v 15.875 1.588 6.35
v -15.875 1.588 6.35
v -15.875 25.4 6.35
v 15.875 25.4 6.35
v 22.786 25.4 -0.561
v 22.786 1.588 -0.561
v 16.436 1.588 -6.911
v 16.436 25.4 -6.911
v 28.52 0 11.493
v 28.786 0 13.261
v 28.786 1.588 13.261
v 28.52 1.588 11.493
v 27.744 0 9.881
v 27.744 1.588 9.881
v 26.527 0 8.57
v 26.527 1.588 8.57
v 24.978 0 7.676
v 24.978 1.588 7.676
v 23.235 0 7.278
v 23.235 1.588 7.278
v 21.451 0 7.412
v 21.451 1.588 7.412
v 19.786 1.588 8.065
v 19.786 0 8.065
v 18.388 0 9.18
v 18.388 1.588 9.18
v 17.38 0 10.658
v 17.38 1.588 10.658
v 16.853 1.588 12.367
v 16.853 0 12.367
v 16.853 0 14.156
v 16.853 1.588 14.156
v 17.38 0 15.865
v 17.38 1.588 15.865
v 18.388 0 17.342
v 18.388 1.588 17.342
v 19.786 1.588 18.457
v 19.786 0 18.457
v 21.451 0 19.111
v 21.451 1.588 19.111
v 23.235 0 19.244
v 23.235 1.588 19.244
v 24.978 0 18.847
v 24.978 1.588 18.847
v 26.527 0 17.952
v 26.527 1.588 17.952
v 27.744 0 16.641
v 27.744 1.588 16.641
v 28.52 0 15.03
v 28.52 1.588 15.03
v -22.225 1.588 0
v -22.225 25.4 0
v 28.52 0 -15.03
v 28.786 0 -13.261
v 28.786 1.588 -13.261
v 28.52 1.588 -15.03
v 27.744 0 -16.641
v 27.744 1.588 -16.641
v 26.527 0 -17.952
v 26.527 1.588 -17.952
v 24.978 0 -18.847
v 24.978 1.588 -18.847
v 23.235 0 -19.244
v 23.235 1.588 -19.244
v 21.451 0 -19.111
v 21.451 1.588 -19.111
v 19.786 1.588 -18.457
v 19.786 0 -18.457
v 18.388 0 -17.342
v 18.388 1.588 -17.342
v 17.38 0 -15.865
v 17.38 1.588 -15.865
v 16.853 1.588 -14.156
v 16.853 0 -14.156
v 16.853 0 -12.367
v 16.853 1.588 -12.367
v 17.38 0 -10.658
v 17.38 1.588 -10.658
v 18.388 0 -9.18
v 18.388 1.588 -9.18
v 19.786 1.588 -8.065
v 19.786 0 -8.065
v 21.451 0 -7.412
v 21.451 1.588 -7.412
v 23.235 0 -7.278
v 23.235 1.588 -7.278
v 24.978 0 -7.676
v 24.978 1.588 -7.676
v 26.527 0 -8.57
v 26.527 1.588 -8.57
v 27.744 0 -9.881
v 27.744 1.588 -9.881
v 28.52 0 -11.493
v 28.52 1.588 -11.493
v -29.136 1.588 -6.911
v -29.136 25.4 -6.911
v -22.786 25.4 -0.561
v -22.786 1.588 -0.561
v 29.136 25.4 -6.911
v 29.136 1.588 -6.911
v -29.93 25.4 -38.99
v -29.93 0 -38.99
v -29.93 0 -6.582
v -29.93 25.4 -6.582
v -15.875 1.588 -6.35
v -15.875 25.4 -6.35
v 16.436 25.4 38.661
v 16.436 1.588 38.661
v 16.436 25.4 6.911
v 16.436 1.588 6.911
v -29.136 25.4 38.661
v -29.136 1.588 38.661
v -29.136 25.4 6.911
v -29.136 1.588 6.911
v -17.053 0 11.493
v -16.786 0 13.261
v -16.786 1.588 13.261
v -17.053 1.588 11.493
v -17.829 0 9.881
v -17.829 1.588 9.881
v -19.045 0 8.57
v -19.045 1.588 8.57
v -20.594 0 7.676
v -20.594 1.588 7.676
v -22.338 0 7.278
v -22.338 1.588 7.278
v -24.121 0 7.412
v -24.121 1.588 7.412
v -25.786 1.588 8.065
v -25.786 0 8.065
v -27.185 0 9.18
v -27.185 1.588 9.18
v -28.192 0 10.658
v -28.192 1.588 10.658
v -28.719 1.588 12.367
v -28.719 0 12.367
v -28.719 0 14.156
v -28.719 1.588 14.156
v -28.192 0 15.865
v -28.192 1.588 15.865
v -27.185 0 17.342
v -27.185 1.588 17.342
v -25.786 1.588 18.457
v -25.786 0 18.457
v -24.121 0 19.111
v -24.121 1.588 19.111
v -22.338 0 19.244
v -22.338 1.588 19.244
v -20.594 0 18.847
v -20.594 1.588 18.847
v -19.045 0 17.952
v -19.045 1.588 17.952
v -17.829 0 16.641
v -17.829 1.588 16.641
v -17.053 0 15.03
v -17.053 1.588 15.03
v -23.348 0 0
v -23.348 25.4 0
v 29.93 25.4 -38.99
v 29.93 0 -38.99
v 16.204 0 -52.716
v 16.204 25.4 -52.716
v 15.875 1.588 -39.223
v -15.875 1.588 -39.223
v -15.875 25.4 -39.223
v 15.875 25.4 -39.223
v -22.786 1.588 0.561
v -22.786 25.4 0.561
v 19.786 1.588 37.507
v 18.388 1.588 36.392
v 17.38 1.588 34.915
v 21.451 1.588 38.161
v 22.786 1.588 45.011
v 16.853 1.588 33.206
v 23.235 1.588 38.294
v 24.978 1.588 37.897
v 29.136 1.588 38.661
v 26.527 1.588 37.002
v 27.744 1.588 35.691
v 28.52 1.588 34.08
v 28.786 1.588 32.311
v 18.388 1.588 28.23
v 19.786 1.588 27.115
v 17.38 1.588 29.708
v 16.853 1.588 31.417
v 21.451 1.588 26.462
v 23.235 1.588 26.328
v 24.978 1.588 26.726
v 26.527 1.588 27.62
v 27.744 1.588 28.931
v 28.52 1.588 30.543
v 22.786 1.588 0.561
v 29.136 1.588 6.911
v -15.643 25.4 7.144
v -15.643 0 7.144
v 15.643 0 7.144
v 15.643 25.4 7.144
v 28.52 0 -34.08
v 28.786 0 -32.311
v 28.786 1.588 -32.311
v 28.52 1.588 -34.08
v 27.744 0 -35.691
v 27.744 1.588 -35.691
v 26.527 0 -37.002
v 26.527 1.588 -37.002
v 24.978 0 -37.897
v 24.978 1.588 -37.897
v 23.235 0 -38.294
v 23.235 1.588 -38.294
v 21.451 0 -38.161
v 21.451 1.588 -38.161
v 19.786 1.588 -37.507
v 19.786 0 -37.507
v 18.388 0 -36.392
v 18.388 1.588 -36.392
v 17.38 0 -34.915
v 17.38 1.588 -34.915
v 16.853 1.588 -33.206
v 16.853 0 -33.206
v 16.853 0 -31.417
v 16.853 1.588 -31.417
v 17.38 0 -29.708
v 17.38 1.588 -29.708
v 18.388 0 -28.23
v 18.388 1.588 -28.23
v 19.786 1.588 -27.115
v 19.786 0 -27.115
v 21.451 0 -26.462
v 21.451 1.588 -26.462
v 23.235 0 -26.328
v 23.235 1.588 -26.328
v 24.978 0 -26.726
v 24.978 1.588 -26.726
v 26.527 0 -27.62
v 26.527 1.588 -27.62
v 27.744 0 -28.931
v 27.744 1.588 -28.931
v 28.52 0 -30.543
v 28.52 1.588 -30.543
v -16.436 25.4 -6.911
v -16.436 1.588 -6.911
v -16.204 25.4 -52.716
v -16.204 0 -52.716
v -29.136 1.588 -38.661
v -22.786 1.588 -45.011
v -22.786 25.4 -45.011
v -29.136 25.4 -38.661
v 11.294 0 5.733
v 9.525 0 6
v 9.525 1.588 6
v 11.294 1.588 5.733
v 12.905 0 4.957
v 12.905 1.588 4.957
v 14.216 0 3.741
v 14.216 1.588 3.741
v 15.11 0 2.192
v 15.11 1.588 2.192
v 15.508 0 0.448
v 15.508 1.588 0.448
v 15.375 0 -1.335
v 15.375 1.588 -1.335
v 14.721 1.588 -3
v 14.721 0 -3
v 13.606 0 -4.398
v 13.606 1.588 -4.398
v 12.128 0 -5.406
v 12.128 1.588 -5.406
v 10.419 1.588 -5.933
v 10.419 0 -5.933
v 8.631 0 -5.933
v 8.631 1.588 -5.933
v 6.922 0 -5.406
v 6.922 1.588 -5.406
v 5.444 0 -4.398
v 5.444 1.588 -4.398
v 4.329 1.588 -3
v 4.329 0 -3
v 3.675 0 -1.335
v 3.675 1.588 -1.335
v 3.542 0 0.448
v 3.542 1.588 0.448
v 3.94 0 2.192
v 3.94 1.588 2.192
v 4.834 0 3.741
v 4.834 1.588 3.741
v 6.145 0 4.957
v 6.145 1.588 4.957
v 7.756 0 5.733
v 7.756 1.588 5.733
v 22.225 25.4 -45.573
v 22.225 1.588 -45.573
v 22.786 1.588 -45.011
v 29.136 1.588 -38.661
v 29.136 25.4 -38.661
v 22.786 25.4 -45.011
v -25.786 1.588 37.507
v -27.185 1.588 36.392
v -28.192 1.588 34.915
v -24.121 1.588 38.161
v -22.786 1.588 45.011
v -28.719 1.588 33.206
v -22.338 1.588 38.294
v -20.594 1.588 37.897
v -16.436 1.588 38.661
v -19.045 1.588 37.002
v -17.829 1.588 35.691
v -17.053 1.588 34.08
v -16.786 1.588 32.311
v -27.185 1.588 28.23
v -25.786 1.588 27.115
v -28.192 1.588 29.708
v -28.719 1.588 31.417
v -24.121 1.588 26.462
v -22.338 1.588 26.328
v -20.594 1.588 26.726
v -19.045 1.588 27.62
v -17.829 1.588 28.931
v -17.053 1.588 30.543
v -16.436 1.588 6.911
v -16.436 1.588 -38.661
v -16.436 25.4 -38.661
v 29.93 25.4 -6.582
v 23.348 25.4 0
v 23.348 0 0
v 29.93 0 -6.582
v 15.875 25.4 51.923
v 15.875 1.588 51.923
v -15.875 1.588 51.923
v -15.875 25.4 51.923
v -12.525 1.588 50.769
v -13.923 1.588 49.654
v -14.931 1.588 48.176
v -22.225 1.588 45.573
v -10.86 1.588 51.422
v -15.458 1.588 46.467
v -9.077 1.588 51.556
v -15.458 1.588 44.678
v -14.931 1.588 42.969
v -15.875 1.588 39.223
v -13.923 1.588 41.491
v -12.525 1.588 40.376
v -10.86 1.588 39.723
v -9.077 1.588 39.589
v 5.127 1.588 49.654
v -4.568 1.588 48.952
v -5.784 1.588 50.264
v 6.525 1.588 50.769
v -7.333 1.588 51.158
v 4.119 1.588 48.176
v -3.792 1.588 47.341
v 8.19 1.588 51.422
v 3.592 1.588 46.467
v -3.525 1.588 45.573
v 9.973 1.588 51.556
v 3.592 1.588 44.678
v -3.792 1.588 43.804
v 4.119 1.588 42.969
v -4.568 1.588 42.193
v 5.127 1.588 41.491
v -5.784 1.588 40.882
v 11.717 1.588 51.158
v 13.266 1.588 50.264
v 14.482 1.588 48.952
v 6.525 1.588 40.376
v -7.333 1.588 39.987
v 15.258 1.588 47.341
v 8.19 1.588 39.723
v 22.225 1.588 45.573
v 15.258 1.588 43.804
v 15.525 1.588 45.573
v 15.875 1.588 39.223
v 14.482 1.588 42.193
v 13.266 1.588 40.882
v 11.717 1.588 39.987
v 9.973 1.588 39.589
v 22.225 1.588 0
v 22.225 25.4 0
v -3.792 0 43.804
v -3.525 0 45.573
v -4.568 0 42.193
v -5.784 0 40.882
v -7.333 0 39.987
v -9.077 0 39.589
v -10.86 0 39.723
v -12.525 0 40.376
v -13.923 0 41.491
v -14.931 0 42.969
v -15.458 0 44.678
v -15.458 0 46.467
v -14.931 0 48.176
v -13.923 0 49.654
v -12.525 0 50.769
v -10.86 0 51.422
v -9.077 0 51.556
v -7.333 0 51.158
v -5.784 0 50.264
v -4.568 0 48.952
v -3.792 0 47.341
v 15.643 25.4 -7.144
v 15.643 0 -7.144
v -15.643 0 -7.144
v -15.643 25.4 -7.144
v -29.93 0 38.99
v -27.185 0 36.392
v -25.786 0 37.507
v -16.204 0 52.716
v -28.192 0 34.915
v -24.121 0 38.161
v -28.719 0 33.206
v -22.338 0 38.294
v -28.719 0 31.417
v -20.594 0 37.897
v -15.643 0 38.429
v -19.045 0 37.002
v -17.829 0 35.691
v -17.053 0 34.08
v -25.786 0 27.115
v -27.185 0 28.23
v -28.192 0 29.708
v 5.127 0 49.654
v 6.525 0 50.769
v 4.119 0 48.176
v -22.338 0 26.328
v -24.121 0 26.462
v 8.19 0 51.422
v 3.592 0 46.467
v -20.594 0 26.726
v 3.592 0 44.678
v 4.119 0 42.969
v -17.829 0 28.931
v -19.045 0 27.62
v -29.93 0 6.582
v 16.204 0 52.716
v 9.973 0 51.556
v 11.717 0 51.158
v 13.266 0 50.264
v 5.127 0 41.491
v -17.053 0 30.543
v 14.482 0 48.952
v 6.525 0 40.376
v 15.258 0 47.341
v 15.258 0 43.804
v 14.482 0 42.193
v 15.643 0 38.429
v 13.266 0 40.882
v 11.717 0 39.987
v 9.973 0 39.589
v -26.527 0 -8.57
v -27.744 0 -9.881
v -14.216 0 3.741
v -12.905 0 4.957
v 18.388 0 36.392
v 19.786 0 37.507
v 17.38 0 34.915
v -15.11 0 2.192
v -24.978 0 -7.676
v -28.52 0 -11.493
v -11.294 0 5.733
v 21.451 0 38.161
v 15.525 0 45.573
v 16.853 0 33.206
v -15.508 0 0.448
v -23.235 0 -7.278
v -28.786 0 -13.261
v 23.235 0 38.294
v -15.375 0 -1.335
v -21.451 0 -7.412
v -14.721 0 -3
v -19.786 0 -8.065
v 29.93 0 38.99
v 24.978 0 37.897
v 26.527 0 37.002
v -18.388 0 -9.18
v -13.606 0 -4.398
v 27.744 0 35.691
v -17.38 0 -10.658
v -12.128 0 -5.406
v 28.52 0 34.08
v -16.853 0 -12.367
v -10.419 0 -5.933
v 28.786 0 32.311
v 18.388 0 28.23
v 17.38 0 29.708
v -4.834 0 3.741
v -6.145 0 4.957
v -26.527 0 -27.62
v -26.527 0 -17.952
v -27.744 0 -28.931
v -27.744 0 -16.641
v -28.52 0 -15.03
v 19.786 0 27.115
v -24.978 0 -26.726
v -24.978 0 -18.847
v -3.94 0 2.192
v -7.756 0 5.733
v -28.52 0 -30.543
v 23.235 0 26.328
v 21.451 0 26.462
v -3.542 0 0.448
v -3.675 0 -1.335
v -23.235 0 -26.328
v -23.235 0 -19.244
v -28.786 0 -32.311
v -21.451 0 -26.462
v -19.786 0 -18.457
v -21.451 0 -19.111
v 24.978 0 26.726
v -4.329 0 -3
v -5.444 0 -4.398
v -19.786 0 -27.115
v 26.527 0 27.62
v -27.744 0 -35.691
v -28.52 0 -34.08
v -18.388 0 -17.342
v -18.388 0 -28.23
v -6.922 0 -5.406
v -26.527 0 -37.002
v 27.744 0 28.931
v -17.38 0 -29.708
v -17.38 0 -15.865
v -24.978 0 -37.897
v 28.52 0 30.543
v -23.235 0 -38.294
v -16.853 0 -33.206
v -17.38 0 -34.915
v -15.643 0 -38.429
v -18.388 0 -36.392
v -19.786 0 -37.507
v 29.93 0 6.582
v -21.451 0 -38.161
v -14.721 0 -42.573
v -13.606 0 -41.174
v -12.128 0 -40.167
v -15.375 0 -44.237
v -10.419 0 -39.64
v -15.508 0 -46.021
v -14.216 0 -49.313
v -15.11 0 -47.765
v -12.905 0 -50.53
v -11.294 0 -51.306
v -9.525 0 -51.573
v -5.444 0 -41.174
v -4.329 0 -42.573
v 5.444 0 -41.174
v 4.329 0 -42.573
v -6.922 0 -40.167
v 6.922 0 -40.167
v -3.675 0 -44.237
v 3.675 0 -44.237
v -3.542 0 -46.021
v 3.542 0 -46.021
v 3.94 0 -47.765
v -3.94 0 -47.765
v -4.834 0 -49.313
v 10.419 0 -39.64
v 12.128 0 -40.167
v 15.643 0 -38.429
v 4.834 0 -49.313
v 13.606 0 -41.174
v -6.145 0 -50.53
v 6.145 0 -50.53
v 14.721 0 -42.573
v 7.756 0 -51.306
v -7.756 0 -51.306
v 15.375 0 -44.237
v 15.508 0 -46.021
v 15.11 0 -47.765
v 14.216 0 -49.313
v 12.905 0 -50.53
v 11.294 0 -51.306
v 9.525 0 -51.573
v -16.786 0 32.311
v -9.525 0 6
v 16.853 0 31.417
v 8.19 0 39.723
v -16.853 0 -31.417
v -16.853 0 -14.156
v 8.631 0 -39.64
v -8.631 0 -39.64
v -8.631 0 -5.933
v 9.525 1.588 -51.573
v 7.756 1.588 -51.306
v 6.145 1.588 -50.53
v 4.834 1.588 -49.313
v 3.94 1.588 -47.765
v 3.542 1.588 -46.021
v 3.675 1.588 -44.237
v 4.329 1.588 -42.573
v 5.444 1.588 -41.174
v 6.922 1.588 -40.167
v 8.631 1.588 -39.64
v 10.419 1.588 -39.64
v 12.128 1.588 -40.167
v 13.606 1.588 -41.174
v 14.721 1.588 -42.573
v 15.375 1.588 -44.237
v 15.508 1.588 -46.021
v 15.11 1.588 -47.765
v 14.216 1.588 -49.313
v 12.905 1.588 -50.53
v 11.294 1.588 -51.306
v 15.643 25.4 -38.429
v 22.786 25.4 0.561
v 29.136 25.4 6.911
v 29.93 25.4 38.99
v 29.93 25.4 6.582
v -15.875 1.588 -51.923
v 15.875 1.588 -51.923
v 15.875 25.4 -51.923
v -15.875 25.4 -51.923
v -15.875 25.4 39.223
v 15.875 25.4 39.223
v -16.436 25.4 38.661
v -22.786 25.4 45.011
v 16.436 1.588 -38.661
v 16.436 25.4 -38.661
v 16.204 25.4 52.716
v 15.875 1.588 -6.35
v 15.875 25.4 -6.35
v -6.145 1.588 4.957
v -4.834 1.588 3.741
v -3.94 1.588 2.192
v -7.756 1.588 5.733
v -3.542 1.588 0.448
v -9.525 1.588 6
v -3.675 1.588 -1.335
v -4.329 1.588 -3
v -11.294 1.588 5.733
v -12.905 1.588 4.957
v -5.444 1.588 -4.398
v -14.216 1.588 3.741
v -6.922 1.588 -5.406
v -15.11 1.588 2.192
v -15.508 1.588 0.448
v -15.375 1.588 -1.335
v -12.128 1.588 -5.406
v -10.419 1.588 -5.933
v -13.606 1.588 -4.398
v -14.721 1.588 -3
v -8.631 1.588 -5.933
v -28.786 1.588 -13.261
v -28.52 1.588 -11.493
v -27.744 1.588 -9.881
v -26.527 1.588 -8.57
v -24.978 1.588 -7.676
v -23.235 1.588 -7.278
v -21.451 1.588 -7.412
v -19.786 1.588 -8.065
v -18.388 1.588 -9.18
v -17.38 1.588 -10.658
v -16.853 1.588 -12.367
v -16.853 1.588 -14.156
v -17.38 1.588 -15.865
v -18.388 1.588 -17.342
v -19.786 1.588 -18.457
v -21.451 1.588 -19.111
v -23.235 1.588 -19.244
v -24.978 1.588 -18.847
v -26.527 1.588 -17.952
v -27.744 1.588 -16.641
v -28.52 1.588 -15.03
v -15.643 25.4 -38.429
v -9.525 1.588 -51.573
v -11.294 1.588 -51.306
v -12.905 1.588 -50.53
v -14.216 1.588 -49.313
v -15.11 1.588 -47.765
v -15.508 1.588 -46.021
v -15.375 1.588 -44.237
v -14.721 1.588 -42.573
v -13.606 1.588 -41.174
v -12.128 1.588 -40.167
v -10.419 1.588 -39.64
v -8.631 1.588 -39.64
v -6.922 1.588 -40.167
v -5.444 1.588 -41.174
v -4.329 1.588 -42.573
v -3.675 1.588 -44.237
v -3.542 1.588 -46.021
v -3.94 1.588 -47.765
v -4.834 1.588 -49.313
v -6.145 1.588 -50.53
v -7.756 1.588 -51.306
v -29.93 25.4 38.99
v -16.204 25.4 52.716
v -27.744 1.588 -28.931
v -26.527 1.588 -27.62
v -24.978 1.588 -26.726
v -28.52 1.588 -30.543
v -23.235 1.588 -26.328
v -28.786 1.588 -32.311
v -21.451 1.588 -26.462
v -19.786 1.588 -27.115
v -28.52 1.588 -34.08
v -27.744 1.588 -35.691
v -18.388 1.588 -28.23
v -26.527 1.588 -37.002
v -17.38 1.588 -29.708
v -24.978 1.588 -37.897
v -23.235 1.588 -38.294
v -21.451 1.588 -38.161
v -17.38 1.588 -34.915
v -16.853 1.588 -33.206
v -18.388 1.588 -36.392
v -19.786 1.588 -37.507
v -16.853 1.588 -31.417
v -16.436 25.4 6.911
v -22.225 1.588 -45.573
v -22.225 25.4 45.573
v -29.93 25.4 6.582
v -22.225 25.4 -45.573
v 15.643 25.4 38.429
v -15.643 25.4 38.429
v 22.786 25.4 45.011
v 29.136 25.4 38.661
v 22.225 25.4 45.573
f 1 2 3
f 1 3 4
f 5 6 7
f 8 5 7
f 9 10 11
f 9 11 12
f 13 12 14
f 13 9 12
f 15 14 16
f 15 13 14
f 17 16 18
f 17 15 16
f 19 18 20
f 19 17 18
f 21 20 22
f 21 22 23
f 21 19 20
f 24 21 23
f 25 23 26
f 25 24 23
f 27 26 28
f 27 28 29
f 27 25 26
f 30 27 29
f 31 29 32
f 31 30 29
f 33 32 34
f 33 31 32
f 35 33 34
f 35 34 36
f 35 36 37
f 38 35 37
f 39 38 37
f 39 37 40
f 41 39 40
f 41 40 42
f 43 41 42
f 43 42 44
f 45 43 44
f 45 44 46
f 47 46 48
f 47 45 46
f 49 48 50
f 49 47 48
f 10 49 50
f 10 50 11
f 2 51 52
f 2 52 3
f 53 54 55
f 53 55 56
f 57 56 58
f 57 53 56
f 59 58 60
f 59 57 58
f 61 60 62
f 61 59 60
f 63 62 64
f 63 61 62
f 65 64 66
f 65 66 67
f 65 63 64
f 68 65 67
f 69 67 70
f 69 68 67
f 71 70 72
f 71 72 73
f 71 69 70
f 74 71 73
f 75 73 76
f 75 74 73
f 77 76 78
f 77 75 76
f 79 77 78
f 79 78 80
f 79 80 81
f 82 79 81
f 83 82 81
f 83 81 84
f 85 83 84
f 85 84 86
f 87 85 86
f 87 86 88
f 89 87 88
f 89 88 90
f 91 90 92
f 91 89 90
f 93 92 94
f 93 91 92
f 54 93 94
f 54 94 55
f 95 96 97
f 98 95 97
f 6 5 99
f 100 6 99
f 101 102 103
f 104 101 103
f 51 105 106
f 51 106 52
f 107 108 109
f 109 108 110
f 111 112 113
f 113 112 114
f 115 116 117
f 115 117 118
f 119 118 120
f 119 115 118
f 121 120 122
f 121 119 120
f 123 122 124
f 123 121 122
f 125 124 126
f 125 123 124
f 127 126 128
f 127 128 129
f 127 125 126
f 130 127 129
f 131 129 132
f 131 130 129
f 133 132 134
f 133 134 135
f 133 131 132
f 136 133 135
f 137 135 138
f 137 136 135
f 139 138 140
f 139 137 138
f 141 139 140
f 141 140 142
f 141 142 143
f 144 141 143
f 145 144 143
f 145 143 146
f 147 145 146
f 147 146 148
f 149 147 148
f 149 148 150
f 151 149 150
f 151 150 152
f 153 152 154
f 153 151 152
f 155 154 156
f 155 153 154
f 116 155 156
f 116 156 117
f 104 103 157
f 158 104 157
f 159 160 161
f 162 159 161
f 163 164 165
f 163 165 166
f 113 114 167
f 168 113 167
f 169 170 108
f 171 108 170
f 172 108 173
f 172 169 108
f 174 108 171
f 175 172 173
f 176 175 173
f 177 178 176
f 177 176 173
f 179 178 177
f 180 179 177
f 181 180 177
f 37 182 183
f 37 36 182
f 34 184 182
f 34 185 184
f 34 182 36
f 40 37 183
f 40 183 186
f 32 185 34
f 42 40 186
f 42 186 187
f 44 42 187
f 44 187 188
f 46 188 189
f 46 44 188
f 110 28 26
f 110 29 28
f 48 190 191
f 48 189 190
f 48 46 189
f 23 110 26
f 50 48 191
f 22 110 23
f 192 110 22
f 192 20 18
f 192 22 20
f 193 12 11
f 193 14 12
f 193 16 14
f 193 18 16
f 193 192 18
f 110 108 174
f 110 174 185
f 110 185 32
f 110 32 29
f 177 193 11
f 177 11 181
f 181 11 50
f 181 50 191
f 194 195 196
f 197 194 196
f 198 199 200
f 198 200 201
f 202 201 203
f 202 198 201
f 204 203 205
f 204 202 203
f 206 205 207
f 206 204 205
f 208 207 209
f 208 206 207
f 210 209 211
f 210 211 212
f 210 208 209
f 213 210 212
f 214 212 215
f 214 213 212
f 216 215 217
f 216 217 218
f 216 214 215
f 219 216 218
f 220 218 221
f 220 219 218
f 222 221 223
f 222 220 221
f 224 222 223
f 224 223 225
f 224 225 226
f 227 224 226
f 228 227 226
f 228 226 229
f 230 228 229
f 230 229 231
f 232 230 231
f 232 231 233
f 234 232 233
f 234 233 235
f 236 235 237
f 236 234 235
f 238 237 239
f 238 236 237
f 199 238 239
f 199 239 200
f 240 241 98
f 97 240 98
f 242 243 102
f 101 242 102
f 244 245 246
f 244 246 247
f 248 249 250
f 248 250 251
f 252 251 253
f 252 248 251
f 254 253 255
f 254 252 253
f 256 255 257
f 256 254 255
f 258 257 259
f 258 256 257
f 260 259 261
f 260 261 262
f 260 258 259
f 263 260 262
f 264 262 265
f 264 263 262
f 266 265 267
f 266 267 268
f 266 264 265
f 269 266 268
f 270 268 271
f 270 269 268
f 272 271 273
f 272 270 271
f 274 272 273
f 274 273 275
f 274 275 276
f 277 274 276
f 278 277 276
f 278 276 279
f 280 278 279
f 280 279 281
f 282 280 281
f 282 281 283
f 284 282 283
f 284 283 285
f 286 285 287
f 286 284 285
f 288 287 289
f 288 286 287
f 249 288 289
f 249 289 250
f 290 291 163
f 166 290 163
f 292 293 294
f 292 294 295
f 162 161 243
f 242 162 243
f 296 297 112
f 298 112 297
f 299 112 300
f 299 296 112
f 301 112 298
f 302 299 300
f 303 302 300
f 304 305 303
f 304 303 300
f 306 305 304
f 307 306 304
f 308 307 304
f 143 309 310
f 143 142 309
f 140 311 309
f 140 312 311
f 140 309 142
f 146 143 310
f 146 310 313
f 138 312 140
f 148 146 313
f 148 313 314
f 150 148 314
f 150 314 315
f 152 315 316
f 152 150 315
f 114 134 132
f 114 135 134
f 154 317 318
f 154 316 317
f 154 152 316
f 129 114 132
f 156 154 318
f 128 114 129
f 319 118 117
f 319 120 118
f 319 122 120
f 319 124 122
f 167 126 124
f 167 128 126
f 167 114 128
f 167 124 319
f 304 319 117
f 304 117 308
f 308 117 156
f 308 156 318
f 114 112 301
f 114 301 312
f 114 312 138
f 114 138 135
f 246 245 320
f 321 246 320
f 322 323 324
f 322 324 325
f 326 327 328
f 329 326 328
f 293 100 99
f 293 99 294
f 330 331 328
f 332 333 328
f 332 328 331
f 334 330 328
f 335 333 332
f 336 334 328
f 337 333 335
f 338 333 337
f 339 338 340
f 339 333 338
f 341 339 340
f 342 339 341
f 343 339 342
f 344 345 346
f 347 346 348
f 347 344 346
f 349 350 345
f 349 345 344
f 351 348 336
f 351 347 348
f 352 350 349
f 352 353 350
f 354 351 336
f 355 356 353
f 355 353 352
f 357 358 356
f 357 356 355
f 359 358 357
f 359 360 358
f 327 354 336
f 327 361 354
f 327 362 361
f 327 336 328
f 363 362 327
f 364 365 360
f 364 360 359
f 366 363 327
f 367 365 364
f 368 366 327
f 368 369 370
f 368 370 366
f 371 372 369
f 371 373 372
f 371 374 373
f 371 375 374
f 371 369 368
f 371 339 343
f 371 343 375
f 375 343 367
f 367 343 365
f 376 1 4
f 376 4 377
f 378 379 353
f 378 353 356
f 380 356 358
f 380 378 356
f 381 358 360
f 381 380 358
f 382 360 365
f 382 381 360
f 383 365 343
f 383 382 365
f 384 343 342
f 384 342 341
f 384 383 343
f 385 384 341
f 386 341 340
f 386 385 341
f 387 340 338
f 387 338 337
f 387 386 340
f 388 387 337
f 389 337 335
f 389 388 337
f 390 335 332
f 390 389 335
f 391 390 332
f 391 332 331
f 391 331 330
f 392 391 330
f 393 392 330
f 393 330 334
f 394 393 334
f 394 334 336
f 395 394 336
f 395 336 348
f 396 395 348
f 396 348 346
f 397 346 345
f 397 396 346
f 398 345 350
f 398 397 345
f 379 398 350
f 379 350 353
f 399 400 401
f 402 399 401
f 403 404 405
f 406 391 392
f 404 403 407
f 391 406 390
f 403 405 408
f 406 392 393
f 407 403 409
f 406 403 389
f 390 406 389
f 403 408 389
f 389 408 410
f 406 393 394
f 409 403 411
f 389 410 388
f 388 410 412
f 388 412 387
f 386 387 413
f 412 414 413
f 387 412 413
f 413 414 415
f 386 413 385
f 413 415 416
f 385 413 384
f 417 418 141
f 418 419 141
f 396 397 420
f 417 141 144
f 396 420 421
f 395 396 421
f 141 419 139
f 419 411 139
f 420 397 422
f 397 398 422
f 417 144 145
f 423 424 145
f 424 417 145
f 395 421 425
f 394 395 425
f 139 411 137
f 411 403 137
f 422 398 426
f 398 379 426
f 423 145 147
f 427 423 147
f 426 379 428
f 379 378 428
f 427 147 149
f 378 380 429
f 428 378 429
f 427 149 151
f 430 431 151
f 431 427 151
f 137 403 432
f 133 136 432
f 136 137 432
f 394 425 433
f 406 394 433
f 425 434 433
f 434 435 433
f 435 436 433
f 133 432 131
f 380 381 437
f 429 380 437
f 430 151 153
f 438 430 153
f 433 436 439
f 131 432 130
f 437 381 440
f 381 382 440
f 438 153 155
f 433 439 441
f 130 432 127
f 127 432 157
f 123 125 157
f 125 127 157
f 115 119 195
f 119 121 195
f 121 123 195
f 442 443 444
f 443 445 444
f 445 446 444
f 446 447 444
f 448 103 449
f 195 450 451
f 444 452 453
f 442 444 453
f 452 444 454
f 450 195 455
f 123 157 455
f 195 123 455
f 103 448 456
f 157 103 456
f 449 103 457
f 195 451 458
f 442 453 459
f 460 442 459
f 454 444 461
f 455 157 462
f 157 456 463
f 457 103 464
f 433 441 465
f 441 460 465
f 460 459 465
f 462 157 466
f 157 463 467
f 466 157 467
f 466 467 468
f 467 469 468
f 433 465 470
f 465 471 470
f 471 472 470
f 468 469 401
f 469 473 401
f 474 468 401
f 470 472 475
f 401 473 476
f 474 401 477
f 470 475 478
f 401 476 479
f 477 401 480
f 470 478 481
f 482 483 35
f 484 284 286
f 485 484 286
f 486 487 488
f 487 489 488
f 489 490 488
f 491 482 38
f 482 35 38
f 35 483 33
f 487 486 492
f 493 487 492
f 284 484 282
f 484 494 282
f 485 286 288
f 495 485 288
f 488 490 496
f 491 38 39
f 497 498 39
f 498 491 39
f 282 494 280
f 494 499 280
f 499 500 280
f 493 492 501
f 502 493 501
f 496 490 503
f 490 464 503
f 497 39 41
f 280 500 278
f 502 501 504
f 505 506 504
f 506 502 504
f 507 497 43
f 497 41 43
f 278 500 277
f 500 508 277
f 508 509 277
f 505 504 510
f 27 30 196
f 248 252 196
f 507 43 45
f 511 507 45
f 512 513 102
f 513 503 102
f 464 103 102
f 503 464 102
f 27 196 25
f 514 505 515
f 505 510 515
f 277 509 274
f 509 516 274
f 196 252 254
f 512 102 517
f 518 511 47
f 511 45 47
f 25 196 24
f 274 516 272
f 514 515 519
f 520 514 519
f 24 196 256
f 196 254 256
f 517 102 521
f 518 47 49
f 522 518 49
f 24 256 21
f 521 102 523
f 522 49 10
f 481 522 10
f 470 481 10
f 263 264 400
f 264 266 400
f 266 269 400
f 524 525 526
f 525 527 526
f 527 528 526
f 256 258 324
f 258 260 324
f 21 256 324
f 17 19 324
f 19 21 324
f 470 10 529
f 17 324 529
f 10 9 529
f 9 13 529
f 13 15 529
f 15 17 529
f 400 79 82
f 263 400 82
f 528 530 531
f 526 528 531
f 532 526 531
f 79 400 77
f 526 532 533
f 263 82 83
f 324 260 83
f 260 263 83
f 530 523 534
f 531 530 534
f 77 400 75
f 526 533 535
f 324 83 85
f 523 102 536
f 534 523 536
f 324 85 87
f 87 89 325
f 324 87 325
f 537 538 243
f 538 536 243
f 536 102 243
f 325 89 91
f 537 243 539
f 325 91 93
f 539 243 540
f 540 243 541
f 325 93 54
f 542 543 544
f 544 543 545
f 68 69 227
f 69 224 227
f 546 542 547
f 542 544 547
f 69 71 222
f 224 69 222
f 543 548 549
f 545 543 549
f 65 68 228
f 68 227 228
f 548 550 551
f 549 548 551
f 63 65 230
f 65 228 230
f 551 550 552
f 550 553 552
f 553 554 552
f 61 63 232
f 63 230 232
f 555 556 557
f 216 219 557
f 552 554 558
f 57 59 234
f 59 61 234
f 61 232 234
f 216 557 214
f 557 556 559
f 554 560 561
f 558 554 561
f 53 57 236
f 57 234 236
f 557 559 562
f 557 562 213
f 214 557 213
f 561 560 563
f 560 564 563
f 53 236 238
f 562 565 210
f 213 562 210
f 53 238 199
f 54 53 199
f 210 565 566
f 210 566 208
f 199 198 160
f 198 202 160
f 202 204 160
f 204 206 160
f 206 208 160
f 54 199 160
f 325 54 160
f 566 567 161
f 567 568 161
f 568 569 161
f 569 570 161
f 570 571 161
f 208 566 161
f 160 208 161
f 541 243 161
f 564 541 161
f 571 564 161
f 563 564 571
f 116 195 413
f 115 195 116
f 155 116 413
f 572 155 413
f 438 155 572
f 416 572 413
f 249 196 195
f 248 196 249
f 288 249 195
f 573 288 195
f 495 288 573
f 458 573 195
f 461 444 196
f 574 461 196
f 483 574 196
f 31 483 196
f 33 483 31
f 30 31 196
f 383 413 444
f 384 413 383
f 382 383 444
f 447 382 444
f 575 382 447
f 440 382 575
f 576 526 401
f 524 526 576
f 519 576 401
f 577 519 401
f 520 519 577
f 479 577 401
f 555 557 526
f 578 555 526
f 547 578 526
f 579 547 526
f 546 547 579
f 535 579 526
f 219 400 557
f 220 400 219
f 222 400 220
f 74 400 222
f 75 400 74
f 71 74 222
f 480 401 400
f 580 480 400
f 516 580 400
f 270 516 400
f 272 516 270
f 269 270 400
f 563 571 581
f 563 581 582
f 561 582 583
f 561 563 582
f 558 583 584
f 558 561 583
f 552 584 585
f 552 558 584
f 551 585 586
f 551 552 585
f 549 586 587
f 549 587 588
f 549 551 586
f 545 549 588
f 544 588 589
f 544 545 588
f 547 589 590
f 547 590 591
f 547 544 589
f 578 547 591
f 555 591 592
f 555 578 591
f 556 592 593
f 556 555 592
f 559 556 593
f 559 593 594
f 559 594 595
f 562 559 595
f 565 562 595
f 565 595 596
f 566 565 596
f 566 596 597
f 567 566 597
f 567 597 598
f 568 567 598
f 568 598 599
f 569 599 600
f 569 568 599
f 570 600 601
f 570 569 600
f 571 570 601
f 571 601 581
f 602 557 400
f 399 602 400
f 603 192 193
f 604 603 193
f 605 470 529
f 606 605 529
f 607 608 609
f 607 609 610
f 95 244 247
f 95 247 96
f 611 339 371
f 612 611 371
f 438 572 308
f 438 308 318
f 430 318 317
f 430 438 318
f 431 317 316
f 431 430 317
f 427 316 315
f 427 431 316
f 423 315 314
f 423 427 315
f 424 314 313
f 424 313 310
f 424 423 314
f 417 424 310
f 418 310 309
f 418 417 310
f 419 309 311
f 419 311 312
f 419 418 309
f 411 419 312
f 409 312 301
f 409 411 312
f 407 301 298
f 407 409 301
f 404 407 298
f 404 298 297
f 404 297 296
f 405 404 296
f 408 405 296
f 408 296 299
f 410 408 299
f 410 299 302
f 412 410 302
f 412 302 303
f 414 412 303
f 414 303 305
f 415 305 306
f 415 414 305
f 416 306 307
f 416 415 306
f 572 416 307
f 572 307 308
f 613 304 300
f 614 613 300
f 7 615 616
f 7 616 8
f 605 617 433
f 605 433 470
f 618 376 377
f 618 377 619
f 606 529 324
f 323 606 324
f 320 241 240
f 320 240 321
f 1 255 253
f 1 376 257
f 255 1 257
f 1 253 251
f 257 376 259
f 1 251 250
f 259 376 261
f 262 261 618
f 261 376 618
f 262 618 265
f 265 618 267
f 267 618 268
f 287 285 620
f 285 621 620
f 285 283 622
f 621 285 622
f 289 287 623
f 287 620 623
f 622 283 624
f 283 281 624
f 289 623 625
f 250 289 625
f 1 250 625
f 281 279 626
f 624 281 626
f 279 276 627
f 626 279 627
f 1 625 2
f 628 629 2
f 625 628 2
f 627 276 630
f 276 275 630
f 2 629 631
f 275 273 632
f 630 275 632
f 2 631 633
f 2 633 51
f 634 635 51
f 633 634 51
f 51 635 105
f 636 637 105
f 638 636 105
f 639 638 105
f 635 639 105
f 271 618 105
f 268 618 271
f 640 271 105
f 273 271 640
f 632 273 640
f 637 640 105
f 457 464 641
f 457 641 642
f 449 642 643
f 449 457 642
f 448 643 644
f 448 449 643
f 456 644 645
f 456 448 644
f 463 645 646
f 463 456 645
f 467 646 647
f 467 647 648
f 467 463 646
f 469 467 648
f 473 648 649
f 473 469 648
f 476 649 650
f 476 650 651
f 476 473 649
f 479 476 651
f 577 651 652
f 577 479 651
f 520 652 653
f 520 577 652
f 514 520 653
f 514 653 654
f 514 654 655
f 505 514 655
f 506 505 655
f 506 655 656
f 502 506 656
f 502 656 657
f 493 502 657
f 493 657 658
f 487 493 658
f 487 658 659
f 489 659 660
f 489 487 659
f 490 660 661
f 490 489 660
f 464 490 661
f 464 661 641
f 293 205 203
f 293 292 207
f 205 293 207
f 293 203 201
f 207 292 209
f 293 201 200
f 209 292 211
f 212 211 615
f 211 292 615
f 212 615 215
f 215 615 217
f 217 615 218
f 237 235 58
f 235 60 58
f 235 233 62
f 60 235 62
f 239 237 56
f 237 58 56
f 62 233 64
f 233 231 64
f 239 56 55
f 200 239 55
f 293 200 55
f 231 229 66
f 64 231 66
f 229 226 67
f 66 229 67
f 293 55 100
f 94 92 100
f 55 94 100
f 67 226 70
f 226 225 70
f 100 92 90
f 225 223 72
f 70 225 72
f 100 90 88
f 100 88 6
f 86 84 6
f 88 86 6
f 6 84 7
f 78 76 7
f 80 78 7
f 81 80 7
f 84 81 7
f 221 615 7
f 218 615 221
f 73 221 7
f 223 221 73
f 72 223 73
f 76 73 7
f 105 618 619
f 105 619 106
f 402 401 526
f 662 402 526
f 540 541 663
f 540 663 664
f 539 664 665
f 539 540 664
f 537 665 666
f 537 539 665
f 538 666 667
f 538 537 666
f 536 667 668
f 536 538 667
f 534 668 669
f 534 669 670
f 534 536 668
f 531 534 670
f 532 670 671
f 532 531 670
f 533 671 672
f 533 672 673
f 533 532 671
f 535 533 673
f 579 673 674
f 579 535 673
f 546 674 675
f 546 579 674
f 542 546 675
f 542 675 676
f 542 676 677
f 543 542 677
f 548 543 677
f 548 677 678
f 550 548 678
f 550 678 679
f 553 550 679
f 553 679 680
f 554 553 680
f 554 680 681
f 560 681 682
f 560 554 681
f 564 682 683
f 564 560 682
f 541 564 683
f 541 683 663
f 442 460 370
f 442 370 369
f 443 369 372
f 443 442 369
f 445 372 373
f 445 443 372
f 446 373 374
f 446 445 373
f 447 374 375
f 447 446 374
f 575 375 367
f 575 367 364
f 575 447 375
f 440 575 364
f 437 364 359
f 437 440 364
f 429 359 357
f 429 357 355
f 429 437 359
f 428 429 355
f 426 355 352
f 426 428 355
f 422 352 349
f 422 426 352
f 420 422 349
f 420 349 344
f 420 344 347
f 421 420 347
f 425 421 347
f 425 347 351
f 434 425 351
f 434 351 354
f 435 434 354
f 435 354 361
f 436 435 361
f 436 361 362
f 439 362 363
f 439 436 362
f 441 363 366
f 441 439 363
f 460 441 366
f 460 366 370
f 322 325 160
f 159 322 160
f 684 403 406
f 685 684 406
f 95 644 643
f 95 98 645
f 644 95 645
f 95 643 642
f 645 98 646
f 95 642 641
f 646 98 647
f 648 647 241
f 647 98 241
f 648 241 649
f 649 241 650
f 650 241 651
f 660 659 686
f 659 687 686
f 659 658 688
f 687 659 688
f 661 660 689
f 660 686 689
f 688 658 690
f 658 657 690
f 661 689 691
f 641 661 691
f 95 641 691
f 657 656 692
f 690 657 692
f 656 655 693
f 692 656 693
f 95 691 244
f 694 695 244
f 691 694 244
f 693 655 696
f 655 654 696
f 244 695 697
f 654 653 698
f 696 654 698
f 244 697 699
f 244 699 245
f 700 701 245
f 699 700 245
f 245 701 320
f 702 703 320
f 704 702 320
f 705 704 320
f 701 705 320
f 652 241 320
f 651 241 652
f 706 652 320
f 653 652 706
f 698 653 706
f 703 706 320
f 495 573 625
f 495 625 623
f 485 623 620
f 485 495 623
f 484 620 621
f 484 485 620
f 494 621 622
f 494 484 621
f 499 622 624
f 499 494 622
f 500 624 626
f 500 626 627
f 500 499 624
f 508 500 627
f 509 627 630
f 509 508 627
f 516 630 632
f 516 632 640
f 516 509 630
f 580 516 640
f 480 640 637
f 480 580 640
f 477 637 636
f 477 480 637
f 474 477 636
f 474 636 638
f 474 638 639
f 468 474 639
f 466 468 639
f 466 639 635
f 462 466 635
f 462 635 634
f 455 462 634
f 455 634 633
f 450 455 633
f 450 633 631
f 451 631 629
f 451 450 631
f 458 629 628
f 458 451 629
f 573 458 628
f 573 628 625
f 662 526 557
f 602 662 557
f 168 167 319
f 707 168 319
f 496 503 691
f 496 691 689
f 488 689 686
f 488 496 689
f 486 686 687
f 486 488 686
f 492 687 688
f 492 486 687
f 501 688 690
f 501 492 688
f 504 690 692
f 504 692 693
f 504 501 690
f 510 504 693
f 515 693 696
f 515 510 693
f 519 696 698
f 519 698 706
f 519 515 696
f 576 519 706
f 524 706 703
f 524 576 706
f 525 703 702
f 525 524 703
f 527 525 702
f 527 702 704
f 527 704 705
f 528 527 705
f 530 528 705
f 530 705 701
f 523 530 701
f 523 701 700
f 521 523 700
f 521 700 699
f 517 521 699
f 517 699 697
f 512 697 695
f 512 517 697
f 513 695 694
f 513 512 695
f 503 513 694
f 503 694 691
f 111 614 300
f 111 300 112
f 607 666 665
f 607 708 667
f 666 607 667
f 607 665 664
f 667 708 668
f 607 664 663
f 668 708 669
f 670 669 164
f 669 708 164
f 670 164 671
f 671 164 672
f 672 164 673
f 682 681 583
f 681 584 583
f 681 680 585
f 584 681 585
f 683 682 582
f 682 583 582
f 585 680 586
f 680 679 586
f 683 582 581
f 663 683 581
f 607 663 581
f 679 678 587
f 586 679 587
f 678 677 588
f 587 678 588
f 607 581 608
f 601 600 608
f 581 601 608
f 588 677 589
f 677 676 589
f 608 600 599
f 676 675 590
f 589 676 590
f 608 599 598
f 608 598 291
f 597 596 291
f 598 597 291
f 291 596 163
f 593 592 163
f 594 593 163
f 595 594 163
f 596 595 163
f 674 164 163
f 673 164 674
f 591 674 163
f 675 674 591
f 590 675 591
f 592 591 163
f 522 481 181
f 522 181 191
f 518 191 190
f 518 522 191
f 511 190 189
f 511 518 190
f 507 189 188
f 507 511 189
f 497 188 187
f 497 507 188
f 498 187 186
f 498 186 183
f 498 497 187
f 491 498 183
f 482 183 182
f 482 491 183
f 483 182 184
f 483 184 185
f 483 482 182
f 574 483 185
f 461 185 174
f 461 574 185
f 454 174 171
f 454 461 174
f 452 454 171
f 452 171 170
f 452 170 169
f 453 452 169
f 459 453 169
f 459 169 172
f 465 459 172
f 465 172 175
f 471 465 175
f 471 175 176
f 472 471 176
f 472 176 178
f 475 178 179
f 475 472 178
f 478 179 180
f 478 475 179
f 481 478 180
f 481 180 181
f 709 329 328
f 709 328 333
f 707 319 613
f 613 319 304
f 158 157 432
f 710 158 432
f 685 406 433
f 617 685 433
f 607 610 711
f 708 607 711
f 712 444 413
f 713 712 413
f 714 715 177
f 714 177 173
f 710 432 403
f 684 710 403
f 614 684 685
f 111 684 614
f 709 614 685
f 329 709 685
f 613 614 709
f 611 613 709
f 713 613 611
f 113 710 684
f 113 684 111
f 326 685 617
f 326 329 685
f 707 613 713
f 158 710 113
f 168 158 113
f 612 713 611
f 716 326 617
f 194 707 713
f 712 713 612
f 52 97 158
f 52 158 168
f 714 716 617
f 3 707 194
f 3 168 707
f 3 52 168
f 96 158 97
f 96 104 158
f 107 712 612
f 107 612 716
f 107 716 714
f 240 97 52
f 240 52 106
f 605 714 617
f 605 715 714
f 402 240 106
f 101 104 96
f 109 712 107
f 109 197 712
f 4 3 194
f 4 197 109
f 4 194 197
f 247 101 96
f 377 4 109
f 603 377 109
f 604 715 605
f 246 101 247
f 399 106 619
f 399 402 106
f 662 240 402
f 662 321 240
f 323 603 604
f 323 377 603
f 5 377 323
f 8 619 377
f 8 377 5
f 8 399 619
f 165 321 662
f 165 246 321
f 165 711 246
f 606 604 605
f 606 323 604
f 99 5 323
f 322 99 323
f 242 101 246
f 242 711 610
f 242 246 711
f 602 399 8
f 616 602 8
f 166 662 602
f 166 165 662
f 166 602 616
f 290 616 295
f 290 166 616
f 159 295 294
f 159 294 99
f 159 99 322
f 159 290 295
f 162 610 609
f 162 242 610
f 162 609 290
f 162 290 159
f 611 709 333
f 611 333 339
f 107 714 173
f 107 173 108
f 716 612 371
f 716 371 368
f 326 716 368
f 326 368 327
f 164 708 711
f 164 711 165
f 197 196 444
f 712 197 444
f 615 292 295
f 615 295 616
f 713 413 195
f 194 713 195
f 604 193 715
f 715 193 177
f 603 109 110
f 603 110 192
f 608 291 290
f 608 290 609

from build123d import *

# Parameters (mm, degrees)
SKETCH1_R               = 6
BOSS_EXTRUDE1_DEPTH     = 1.5875
EXTRUDE_THIN1_DEPTH     = 25.4
CIRPATTERN1_COUNT       = 4
MIRROR1_COPY_1_SKETCH_R = 6
MIRROR1_COPY_1_DEPTH    = 1.5875
MIRROR1_COPY_2_SKETCH_R = 6
MIRROR1_COPY_2_DEPTH    = 1.5875
MIRROR1_COPY_3_SKETCH_R = 6
MIRROR1_COPY_3_DEPTH    = 1.5875
MIRROR1_COPY_4_DEPTH    = 25.4
MIRROR1_COPY_5_DEPTH    = 25.4
MIRROR1_COPY_6_DEPTH    = 25.4
MIRROR1_COPY_7_SKETCH_R = 6
MIRROR1_COPY_7_DEPTH    = 1.5875
MIRROR1_COPY_8_DEPTH    = 25.4


with BuildPart() as part:
    # Sketch1 → Boss-Extrude1 (new body)
    with BuildSketch(Plane(origin=(0, 0, 0), x_dir=(1, 0, 0), z_dir=(0, 1, 0))):
        Polygon((-22.225, 0), (-15.875, 6.35), (15.875, 6.35), (22.225, 0), (15.875, -6.35), (-15.875, -6.35), align=None)
        with Locations((-9.525, 0)):
            Circle(SKETCH1_R, mode=Mode.SUBTRACT)
        with Locations((9.525, 0)):
            Circle(SKETCH1_R, mode=Mode.SUBTRACT)
    boss_extrude1 = extrude(amount=BOSS_EXTRUDE1_DEPTH)

    # Sketch2 → Extrude-Thin1 (add)
    with BuildSketch(Plane(origin=(0, 0, 0), x_dir=(1, 0, 0), z_dir=(0, 1, 0))):
        Polygon((-23.347532015, 0), (-16.203782015, -7.14375), (16.203782015, -7.14375), (23.347532015, 0), (16.203782015, 7.14375), (-16.203782015, 7.14375), align=None)
        Polygon((-22.225, 0), (-15.875, -6.35), (15.875, -6.35), (22.225, 0), (15.875, 6.35), (-15.875, 6.35), align=None, mode=Mode.SUBTRACT)
    extrude_thin1 = extrude(amount=EXTRUDE_THIN1_DEPTH)

    # CirPattern1: Boss-Extrude1, Extrude-Thin1 ×4 about axis
    cirpattern1_axis = Axis((0, 0, -22.786266008), (0, 1, 0))
    add([boss_extrude1.rotate(cirpattern1_axis, i * 360 / CIRPATTERN1_COUNT) for i in range(1, CIRPATTERN1_COUNT)])
    add([extrude_thin1.rotate(cirpattern1_axis, i * 360 / CIRPATTERN1_COUNT) for i in range(1, CIRPATTERN1_COUNT)])

    # Mirror1 copy 1 sketch → Mirror1 copy 1 (add)
    with BuildSketch(Plane(origin=(22.786266008, 0, 22.786266008), x_dir=(0, 0, 1), z_dir=(0, 1, 0))):
        Polygon((-22.225, 0), (-15.875, -6.35), (15.875, -6.35), (22.225, 0), (15.875, 6.35), (-15.875, 6.35), align=None)
        with Locations((-9.525, 0)):
            Circle(MIRROR1_COPY_1_SKETCH_R, mode=Mode.SUBTRACT)
        with Locations((9.525, 0)):
            Circle(MIRROR1_COPY_1_SKETCH_R, mode=Mode.SUBTRACT)
    extrude(amount=MIRROR1_COPY_1_DEPTH)

    # Mirror1 copy 2 sketch → Mirror1 copy 2 (add)
    with BuildSketch(Plane(origin=(0, 0, 45.572532015), x_dir=(-1, 0, 0), z_dir=(0, 1, 0))):
        Polygon((-22.225, 0), (-15.875, -6.35), (15.875, -6.35), (22.225, 0), (15.875, 6.35), (-15.875, 6.35), align=None)
        with Locations((-9.525, 0)):
            Circle(MIRROR1_COPY_2_SKETCH_R, mode=Mode.SUBTRACT)
        with Locations((9.525, 0)):
            Circle(MIRROR1_COPY_2_SKETCH_R, mode=Mode.SUBTRACT)
    extrude(amount=MIRROR1_COPY_2_DEPTH)

    # Mirror1 copy 3 sketch → Mirror1 copy 3 (add)
    with BuildSketch(Plane(origin=(-22.786266008, 0, 22.786266008), x_dir=(0, 0, -1), z_dir=(0, 1, 0))):
        Polygon((-22.225, 0), (-15.875, -6.35), (15.875, -6.35), (22.225, 0), (15.875, 6.35), (-15.875, 6.35), align=None)
        with Locations((-9.525, 0)):
            Circle(MIRROR1_COPY_3_SKETCH_R, mode=Mode.SUBTRACT)
        with Locations((9.525, 0)):
            Circle(MIRROR1_COPY_3_SKETCH_R, mode=Mode.SUBTRACT)
    extrude(amount=MIRROR1_COPY_3_DEPTH)

    # Mirror1 copy 4 sketch → Mirror1 copy 4 (add)
    with BuildSketch(Plane(origin=(22.786266008, 0, 22.786266008), x_dir=(0, 0, 1), z_dir=(0, 1, 0))):
        Polygon((-23.347532015, 0), (-16.203782015, 7.14375), (16.203782015, 7.14375), (23.347532015, 0), (16.203782015, -7.14375), (-16.203782015, -7.14375), align=None)
        Polygon((-22.225, 0), (-15.875, 6.35), (15.875, 6.35), (22.225, 0), (15.875, -6.35), (-15.875, -6.35), align=None, mode=Mode.SUBTRACT)
    extrude(amount=MIRROR1_COPY_4_DEPTH)

    # Mirror1 copy 5 sketch → Mirror1 copy 5 (add)
    with BuildSketch(Plane(origin=(0, 0, 45.572532015), x_dir=(-1, 0, 0), z_dir=(0, 1, 0))):
        Polygon((-23.347532015, 0), (-16.203782015, 7.14375), (16.203782015, 7.14375), (23.347532015, 0), (16.203782015, -7.14375), (-16.203782015, -7.14375), align=None)
        Polygon((-22.225, 0), (-15.875, 6.35), (15.875, 6.35), (22.225, 0), (15.875, -6.35), (-15.875, -6.35), align=None, mode=Mode.SUBTRACT)
    extrude(amount=MIRROR1_COPY_5_DEPTH)

    # Mirror1 copy 6 sketch → Mirror1 copy 6 (add)
    with BuildSketch(Plane(origin=(-22.786266008, 0, 22.786266008), x_dir=(0, 0, -1), z_dir=(0, 1, 0))):
        Polygon((-23.347532015, 0), (-16.203782015, 7.14375), (16.203782015, 7.14375), (23.347532015, 0), (16.203782015, -7.14375), (-16.203782015, -7.14375), align=None)
        Polygon((-22.225, 0), (-15.875, 6.35), (15.875, 6.35), (22.225, 0), (15.875, -6.35), (-15.875, -6.35), align=None, mode=Mode.SUBTRACT)
    extrude(amount=MIRROR1_COPY_6_DEPTH)

    # Mirror1 copy 7 sketch → Mirror1 copy 7 (add)
    with BuildSketch(Plane(origin=(0, 0, 0), x_dir=(1, 0, 0), z_dir=(0, 1, 0))):
        Polygon((-22.225, 0), (-15.875, -6.35), (15.875, -6.35), (22.225, 0), (15.875, 6.35), (-15.875, 6.35), align=None)
        with Locations((-9.525, 0)):
            Circle(MIRROR1_COPY_7_SKETCH_R, mode=Mode.SUBTRACT)
        with Locations((9.525, 0)):
            Circle(MIRROR1_COPY_7_SKETCH_R, mode=Mode.SUBTRACT)
    extrude(amount=MIRROR1_COPY_7_DEPTH)

    # Mirror1 copy 8 sketch → Mirror1 copy 8 (add)
    with BuildSketch(Plane(origin=(0, 0, 0), x_dir=(1, 0, 0), z_dir=(0, 1, 0))):
        Polygon((-23.347532015, 0), (-16.203782015, 7.14375), (16.203782015, 7.14375), (23.347532015, 0), (16.203782015, -7.14375), (-16.203782015, -7.14375), align=None)
        Polygon((-22.225, 0), (-15.875, 6.35), (15.875, 6.35), (22.225, 0), (15.875, -6.35), (-15.875, -6.35), align=None, mode=Mode.SUBTRACT)
    extrude(amount=MIRROR1_COPY_8_DEPTH)


solid = part.part
